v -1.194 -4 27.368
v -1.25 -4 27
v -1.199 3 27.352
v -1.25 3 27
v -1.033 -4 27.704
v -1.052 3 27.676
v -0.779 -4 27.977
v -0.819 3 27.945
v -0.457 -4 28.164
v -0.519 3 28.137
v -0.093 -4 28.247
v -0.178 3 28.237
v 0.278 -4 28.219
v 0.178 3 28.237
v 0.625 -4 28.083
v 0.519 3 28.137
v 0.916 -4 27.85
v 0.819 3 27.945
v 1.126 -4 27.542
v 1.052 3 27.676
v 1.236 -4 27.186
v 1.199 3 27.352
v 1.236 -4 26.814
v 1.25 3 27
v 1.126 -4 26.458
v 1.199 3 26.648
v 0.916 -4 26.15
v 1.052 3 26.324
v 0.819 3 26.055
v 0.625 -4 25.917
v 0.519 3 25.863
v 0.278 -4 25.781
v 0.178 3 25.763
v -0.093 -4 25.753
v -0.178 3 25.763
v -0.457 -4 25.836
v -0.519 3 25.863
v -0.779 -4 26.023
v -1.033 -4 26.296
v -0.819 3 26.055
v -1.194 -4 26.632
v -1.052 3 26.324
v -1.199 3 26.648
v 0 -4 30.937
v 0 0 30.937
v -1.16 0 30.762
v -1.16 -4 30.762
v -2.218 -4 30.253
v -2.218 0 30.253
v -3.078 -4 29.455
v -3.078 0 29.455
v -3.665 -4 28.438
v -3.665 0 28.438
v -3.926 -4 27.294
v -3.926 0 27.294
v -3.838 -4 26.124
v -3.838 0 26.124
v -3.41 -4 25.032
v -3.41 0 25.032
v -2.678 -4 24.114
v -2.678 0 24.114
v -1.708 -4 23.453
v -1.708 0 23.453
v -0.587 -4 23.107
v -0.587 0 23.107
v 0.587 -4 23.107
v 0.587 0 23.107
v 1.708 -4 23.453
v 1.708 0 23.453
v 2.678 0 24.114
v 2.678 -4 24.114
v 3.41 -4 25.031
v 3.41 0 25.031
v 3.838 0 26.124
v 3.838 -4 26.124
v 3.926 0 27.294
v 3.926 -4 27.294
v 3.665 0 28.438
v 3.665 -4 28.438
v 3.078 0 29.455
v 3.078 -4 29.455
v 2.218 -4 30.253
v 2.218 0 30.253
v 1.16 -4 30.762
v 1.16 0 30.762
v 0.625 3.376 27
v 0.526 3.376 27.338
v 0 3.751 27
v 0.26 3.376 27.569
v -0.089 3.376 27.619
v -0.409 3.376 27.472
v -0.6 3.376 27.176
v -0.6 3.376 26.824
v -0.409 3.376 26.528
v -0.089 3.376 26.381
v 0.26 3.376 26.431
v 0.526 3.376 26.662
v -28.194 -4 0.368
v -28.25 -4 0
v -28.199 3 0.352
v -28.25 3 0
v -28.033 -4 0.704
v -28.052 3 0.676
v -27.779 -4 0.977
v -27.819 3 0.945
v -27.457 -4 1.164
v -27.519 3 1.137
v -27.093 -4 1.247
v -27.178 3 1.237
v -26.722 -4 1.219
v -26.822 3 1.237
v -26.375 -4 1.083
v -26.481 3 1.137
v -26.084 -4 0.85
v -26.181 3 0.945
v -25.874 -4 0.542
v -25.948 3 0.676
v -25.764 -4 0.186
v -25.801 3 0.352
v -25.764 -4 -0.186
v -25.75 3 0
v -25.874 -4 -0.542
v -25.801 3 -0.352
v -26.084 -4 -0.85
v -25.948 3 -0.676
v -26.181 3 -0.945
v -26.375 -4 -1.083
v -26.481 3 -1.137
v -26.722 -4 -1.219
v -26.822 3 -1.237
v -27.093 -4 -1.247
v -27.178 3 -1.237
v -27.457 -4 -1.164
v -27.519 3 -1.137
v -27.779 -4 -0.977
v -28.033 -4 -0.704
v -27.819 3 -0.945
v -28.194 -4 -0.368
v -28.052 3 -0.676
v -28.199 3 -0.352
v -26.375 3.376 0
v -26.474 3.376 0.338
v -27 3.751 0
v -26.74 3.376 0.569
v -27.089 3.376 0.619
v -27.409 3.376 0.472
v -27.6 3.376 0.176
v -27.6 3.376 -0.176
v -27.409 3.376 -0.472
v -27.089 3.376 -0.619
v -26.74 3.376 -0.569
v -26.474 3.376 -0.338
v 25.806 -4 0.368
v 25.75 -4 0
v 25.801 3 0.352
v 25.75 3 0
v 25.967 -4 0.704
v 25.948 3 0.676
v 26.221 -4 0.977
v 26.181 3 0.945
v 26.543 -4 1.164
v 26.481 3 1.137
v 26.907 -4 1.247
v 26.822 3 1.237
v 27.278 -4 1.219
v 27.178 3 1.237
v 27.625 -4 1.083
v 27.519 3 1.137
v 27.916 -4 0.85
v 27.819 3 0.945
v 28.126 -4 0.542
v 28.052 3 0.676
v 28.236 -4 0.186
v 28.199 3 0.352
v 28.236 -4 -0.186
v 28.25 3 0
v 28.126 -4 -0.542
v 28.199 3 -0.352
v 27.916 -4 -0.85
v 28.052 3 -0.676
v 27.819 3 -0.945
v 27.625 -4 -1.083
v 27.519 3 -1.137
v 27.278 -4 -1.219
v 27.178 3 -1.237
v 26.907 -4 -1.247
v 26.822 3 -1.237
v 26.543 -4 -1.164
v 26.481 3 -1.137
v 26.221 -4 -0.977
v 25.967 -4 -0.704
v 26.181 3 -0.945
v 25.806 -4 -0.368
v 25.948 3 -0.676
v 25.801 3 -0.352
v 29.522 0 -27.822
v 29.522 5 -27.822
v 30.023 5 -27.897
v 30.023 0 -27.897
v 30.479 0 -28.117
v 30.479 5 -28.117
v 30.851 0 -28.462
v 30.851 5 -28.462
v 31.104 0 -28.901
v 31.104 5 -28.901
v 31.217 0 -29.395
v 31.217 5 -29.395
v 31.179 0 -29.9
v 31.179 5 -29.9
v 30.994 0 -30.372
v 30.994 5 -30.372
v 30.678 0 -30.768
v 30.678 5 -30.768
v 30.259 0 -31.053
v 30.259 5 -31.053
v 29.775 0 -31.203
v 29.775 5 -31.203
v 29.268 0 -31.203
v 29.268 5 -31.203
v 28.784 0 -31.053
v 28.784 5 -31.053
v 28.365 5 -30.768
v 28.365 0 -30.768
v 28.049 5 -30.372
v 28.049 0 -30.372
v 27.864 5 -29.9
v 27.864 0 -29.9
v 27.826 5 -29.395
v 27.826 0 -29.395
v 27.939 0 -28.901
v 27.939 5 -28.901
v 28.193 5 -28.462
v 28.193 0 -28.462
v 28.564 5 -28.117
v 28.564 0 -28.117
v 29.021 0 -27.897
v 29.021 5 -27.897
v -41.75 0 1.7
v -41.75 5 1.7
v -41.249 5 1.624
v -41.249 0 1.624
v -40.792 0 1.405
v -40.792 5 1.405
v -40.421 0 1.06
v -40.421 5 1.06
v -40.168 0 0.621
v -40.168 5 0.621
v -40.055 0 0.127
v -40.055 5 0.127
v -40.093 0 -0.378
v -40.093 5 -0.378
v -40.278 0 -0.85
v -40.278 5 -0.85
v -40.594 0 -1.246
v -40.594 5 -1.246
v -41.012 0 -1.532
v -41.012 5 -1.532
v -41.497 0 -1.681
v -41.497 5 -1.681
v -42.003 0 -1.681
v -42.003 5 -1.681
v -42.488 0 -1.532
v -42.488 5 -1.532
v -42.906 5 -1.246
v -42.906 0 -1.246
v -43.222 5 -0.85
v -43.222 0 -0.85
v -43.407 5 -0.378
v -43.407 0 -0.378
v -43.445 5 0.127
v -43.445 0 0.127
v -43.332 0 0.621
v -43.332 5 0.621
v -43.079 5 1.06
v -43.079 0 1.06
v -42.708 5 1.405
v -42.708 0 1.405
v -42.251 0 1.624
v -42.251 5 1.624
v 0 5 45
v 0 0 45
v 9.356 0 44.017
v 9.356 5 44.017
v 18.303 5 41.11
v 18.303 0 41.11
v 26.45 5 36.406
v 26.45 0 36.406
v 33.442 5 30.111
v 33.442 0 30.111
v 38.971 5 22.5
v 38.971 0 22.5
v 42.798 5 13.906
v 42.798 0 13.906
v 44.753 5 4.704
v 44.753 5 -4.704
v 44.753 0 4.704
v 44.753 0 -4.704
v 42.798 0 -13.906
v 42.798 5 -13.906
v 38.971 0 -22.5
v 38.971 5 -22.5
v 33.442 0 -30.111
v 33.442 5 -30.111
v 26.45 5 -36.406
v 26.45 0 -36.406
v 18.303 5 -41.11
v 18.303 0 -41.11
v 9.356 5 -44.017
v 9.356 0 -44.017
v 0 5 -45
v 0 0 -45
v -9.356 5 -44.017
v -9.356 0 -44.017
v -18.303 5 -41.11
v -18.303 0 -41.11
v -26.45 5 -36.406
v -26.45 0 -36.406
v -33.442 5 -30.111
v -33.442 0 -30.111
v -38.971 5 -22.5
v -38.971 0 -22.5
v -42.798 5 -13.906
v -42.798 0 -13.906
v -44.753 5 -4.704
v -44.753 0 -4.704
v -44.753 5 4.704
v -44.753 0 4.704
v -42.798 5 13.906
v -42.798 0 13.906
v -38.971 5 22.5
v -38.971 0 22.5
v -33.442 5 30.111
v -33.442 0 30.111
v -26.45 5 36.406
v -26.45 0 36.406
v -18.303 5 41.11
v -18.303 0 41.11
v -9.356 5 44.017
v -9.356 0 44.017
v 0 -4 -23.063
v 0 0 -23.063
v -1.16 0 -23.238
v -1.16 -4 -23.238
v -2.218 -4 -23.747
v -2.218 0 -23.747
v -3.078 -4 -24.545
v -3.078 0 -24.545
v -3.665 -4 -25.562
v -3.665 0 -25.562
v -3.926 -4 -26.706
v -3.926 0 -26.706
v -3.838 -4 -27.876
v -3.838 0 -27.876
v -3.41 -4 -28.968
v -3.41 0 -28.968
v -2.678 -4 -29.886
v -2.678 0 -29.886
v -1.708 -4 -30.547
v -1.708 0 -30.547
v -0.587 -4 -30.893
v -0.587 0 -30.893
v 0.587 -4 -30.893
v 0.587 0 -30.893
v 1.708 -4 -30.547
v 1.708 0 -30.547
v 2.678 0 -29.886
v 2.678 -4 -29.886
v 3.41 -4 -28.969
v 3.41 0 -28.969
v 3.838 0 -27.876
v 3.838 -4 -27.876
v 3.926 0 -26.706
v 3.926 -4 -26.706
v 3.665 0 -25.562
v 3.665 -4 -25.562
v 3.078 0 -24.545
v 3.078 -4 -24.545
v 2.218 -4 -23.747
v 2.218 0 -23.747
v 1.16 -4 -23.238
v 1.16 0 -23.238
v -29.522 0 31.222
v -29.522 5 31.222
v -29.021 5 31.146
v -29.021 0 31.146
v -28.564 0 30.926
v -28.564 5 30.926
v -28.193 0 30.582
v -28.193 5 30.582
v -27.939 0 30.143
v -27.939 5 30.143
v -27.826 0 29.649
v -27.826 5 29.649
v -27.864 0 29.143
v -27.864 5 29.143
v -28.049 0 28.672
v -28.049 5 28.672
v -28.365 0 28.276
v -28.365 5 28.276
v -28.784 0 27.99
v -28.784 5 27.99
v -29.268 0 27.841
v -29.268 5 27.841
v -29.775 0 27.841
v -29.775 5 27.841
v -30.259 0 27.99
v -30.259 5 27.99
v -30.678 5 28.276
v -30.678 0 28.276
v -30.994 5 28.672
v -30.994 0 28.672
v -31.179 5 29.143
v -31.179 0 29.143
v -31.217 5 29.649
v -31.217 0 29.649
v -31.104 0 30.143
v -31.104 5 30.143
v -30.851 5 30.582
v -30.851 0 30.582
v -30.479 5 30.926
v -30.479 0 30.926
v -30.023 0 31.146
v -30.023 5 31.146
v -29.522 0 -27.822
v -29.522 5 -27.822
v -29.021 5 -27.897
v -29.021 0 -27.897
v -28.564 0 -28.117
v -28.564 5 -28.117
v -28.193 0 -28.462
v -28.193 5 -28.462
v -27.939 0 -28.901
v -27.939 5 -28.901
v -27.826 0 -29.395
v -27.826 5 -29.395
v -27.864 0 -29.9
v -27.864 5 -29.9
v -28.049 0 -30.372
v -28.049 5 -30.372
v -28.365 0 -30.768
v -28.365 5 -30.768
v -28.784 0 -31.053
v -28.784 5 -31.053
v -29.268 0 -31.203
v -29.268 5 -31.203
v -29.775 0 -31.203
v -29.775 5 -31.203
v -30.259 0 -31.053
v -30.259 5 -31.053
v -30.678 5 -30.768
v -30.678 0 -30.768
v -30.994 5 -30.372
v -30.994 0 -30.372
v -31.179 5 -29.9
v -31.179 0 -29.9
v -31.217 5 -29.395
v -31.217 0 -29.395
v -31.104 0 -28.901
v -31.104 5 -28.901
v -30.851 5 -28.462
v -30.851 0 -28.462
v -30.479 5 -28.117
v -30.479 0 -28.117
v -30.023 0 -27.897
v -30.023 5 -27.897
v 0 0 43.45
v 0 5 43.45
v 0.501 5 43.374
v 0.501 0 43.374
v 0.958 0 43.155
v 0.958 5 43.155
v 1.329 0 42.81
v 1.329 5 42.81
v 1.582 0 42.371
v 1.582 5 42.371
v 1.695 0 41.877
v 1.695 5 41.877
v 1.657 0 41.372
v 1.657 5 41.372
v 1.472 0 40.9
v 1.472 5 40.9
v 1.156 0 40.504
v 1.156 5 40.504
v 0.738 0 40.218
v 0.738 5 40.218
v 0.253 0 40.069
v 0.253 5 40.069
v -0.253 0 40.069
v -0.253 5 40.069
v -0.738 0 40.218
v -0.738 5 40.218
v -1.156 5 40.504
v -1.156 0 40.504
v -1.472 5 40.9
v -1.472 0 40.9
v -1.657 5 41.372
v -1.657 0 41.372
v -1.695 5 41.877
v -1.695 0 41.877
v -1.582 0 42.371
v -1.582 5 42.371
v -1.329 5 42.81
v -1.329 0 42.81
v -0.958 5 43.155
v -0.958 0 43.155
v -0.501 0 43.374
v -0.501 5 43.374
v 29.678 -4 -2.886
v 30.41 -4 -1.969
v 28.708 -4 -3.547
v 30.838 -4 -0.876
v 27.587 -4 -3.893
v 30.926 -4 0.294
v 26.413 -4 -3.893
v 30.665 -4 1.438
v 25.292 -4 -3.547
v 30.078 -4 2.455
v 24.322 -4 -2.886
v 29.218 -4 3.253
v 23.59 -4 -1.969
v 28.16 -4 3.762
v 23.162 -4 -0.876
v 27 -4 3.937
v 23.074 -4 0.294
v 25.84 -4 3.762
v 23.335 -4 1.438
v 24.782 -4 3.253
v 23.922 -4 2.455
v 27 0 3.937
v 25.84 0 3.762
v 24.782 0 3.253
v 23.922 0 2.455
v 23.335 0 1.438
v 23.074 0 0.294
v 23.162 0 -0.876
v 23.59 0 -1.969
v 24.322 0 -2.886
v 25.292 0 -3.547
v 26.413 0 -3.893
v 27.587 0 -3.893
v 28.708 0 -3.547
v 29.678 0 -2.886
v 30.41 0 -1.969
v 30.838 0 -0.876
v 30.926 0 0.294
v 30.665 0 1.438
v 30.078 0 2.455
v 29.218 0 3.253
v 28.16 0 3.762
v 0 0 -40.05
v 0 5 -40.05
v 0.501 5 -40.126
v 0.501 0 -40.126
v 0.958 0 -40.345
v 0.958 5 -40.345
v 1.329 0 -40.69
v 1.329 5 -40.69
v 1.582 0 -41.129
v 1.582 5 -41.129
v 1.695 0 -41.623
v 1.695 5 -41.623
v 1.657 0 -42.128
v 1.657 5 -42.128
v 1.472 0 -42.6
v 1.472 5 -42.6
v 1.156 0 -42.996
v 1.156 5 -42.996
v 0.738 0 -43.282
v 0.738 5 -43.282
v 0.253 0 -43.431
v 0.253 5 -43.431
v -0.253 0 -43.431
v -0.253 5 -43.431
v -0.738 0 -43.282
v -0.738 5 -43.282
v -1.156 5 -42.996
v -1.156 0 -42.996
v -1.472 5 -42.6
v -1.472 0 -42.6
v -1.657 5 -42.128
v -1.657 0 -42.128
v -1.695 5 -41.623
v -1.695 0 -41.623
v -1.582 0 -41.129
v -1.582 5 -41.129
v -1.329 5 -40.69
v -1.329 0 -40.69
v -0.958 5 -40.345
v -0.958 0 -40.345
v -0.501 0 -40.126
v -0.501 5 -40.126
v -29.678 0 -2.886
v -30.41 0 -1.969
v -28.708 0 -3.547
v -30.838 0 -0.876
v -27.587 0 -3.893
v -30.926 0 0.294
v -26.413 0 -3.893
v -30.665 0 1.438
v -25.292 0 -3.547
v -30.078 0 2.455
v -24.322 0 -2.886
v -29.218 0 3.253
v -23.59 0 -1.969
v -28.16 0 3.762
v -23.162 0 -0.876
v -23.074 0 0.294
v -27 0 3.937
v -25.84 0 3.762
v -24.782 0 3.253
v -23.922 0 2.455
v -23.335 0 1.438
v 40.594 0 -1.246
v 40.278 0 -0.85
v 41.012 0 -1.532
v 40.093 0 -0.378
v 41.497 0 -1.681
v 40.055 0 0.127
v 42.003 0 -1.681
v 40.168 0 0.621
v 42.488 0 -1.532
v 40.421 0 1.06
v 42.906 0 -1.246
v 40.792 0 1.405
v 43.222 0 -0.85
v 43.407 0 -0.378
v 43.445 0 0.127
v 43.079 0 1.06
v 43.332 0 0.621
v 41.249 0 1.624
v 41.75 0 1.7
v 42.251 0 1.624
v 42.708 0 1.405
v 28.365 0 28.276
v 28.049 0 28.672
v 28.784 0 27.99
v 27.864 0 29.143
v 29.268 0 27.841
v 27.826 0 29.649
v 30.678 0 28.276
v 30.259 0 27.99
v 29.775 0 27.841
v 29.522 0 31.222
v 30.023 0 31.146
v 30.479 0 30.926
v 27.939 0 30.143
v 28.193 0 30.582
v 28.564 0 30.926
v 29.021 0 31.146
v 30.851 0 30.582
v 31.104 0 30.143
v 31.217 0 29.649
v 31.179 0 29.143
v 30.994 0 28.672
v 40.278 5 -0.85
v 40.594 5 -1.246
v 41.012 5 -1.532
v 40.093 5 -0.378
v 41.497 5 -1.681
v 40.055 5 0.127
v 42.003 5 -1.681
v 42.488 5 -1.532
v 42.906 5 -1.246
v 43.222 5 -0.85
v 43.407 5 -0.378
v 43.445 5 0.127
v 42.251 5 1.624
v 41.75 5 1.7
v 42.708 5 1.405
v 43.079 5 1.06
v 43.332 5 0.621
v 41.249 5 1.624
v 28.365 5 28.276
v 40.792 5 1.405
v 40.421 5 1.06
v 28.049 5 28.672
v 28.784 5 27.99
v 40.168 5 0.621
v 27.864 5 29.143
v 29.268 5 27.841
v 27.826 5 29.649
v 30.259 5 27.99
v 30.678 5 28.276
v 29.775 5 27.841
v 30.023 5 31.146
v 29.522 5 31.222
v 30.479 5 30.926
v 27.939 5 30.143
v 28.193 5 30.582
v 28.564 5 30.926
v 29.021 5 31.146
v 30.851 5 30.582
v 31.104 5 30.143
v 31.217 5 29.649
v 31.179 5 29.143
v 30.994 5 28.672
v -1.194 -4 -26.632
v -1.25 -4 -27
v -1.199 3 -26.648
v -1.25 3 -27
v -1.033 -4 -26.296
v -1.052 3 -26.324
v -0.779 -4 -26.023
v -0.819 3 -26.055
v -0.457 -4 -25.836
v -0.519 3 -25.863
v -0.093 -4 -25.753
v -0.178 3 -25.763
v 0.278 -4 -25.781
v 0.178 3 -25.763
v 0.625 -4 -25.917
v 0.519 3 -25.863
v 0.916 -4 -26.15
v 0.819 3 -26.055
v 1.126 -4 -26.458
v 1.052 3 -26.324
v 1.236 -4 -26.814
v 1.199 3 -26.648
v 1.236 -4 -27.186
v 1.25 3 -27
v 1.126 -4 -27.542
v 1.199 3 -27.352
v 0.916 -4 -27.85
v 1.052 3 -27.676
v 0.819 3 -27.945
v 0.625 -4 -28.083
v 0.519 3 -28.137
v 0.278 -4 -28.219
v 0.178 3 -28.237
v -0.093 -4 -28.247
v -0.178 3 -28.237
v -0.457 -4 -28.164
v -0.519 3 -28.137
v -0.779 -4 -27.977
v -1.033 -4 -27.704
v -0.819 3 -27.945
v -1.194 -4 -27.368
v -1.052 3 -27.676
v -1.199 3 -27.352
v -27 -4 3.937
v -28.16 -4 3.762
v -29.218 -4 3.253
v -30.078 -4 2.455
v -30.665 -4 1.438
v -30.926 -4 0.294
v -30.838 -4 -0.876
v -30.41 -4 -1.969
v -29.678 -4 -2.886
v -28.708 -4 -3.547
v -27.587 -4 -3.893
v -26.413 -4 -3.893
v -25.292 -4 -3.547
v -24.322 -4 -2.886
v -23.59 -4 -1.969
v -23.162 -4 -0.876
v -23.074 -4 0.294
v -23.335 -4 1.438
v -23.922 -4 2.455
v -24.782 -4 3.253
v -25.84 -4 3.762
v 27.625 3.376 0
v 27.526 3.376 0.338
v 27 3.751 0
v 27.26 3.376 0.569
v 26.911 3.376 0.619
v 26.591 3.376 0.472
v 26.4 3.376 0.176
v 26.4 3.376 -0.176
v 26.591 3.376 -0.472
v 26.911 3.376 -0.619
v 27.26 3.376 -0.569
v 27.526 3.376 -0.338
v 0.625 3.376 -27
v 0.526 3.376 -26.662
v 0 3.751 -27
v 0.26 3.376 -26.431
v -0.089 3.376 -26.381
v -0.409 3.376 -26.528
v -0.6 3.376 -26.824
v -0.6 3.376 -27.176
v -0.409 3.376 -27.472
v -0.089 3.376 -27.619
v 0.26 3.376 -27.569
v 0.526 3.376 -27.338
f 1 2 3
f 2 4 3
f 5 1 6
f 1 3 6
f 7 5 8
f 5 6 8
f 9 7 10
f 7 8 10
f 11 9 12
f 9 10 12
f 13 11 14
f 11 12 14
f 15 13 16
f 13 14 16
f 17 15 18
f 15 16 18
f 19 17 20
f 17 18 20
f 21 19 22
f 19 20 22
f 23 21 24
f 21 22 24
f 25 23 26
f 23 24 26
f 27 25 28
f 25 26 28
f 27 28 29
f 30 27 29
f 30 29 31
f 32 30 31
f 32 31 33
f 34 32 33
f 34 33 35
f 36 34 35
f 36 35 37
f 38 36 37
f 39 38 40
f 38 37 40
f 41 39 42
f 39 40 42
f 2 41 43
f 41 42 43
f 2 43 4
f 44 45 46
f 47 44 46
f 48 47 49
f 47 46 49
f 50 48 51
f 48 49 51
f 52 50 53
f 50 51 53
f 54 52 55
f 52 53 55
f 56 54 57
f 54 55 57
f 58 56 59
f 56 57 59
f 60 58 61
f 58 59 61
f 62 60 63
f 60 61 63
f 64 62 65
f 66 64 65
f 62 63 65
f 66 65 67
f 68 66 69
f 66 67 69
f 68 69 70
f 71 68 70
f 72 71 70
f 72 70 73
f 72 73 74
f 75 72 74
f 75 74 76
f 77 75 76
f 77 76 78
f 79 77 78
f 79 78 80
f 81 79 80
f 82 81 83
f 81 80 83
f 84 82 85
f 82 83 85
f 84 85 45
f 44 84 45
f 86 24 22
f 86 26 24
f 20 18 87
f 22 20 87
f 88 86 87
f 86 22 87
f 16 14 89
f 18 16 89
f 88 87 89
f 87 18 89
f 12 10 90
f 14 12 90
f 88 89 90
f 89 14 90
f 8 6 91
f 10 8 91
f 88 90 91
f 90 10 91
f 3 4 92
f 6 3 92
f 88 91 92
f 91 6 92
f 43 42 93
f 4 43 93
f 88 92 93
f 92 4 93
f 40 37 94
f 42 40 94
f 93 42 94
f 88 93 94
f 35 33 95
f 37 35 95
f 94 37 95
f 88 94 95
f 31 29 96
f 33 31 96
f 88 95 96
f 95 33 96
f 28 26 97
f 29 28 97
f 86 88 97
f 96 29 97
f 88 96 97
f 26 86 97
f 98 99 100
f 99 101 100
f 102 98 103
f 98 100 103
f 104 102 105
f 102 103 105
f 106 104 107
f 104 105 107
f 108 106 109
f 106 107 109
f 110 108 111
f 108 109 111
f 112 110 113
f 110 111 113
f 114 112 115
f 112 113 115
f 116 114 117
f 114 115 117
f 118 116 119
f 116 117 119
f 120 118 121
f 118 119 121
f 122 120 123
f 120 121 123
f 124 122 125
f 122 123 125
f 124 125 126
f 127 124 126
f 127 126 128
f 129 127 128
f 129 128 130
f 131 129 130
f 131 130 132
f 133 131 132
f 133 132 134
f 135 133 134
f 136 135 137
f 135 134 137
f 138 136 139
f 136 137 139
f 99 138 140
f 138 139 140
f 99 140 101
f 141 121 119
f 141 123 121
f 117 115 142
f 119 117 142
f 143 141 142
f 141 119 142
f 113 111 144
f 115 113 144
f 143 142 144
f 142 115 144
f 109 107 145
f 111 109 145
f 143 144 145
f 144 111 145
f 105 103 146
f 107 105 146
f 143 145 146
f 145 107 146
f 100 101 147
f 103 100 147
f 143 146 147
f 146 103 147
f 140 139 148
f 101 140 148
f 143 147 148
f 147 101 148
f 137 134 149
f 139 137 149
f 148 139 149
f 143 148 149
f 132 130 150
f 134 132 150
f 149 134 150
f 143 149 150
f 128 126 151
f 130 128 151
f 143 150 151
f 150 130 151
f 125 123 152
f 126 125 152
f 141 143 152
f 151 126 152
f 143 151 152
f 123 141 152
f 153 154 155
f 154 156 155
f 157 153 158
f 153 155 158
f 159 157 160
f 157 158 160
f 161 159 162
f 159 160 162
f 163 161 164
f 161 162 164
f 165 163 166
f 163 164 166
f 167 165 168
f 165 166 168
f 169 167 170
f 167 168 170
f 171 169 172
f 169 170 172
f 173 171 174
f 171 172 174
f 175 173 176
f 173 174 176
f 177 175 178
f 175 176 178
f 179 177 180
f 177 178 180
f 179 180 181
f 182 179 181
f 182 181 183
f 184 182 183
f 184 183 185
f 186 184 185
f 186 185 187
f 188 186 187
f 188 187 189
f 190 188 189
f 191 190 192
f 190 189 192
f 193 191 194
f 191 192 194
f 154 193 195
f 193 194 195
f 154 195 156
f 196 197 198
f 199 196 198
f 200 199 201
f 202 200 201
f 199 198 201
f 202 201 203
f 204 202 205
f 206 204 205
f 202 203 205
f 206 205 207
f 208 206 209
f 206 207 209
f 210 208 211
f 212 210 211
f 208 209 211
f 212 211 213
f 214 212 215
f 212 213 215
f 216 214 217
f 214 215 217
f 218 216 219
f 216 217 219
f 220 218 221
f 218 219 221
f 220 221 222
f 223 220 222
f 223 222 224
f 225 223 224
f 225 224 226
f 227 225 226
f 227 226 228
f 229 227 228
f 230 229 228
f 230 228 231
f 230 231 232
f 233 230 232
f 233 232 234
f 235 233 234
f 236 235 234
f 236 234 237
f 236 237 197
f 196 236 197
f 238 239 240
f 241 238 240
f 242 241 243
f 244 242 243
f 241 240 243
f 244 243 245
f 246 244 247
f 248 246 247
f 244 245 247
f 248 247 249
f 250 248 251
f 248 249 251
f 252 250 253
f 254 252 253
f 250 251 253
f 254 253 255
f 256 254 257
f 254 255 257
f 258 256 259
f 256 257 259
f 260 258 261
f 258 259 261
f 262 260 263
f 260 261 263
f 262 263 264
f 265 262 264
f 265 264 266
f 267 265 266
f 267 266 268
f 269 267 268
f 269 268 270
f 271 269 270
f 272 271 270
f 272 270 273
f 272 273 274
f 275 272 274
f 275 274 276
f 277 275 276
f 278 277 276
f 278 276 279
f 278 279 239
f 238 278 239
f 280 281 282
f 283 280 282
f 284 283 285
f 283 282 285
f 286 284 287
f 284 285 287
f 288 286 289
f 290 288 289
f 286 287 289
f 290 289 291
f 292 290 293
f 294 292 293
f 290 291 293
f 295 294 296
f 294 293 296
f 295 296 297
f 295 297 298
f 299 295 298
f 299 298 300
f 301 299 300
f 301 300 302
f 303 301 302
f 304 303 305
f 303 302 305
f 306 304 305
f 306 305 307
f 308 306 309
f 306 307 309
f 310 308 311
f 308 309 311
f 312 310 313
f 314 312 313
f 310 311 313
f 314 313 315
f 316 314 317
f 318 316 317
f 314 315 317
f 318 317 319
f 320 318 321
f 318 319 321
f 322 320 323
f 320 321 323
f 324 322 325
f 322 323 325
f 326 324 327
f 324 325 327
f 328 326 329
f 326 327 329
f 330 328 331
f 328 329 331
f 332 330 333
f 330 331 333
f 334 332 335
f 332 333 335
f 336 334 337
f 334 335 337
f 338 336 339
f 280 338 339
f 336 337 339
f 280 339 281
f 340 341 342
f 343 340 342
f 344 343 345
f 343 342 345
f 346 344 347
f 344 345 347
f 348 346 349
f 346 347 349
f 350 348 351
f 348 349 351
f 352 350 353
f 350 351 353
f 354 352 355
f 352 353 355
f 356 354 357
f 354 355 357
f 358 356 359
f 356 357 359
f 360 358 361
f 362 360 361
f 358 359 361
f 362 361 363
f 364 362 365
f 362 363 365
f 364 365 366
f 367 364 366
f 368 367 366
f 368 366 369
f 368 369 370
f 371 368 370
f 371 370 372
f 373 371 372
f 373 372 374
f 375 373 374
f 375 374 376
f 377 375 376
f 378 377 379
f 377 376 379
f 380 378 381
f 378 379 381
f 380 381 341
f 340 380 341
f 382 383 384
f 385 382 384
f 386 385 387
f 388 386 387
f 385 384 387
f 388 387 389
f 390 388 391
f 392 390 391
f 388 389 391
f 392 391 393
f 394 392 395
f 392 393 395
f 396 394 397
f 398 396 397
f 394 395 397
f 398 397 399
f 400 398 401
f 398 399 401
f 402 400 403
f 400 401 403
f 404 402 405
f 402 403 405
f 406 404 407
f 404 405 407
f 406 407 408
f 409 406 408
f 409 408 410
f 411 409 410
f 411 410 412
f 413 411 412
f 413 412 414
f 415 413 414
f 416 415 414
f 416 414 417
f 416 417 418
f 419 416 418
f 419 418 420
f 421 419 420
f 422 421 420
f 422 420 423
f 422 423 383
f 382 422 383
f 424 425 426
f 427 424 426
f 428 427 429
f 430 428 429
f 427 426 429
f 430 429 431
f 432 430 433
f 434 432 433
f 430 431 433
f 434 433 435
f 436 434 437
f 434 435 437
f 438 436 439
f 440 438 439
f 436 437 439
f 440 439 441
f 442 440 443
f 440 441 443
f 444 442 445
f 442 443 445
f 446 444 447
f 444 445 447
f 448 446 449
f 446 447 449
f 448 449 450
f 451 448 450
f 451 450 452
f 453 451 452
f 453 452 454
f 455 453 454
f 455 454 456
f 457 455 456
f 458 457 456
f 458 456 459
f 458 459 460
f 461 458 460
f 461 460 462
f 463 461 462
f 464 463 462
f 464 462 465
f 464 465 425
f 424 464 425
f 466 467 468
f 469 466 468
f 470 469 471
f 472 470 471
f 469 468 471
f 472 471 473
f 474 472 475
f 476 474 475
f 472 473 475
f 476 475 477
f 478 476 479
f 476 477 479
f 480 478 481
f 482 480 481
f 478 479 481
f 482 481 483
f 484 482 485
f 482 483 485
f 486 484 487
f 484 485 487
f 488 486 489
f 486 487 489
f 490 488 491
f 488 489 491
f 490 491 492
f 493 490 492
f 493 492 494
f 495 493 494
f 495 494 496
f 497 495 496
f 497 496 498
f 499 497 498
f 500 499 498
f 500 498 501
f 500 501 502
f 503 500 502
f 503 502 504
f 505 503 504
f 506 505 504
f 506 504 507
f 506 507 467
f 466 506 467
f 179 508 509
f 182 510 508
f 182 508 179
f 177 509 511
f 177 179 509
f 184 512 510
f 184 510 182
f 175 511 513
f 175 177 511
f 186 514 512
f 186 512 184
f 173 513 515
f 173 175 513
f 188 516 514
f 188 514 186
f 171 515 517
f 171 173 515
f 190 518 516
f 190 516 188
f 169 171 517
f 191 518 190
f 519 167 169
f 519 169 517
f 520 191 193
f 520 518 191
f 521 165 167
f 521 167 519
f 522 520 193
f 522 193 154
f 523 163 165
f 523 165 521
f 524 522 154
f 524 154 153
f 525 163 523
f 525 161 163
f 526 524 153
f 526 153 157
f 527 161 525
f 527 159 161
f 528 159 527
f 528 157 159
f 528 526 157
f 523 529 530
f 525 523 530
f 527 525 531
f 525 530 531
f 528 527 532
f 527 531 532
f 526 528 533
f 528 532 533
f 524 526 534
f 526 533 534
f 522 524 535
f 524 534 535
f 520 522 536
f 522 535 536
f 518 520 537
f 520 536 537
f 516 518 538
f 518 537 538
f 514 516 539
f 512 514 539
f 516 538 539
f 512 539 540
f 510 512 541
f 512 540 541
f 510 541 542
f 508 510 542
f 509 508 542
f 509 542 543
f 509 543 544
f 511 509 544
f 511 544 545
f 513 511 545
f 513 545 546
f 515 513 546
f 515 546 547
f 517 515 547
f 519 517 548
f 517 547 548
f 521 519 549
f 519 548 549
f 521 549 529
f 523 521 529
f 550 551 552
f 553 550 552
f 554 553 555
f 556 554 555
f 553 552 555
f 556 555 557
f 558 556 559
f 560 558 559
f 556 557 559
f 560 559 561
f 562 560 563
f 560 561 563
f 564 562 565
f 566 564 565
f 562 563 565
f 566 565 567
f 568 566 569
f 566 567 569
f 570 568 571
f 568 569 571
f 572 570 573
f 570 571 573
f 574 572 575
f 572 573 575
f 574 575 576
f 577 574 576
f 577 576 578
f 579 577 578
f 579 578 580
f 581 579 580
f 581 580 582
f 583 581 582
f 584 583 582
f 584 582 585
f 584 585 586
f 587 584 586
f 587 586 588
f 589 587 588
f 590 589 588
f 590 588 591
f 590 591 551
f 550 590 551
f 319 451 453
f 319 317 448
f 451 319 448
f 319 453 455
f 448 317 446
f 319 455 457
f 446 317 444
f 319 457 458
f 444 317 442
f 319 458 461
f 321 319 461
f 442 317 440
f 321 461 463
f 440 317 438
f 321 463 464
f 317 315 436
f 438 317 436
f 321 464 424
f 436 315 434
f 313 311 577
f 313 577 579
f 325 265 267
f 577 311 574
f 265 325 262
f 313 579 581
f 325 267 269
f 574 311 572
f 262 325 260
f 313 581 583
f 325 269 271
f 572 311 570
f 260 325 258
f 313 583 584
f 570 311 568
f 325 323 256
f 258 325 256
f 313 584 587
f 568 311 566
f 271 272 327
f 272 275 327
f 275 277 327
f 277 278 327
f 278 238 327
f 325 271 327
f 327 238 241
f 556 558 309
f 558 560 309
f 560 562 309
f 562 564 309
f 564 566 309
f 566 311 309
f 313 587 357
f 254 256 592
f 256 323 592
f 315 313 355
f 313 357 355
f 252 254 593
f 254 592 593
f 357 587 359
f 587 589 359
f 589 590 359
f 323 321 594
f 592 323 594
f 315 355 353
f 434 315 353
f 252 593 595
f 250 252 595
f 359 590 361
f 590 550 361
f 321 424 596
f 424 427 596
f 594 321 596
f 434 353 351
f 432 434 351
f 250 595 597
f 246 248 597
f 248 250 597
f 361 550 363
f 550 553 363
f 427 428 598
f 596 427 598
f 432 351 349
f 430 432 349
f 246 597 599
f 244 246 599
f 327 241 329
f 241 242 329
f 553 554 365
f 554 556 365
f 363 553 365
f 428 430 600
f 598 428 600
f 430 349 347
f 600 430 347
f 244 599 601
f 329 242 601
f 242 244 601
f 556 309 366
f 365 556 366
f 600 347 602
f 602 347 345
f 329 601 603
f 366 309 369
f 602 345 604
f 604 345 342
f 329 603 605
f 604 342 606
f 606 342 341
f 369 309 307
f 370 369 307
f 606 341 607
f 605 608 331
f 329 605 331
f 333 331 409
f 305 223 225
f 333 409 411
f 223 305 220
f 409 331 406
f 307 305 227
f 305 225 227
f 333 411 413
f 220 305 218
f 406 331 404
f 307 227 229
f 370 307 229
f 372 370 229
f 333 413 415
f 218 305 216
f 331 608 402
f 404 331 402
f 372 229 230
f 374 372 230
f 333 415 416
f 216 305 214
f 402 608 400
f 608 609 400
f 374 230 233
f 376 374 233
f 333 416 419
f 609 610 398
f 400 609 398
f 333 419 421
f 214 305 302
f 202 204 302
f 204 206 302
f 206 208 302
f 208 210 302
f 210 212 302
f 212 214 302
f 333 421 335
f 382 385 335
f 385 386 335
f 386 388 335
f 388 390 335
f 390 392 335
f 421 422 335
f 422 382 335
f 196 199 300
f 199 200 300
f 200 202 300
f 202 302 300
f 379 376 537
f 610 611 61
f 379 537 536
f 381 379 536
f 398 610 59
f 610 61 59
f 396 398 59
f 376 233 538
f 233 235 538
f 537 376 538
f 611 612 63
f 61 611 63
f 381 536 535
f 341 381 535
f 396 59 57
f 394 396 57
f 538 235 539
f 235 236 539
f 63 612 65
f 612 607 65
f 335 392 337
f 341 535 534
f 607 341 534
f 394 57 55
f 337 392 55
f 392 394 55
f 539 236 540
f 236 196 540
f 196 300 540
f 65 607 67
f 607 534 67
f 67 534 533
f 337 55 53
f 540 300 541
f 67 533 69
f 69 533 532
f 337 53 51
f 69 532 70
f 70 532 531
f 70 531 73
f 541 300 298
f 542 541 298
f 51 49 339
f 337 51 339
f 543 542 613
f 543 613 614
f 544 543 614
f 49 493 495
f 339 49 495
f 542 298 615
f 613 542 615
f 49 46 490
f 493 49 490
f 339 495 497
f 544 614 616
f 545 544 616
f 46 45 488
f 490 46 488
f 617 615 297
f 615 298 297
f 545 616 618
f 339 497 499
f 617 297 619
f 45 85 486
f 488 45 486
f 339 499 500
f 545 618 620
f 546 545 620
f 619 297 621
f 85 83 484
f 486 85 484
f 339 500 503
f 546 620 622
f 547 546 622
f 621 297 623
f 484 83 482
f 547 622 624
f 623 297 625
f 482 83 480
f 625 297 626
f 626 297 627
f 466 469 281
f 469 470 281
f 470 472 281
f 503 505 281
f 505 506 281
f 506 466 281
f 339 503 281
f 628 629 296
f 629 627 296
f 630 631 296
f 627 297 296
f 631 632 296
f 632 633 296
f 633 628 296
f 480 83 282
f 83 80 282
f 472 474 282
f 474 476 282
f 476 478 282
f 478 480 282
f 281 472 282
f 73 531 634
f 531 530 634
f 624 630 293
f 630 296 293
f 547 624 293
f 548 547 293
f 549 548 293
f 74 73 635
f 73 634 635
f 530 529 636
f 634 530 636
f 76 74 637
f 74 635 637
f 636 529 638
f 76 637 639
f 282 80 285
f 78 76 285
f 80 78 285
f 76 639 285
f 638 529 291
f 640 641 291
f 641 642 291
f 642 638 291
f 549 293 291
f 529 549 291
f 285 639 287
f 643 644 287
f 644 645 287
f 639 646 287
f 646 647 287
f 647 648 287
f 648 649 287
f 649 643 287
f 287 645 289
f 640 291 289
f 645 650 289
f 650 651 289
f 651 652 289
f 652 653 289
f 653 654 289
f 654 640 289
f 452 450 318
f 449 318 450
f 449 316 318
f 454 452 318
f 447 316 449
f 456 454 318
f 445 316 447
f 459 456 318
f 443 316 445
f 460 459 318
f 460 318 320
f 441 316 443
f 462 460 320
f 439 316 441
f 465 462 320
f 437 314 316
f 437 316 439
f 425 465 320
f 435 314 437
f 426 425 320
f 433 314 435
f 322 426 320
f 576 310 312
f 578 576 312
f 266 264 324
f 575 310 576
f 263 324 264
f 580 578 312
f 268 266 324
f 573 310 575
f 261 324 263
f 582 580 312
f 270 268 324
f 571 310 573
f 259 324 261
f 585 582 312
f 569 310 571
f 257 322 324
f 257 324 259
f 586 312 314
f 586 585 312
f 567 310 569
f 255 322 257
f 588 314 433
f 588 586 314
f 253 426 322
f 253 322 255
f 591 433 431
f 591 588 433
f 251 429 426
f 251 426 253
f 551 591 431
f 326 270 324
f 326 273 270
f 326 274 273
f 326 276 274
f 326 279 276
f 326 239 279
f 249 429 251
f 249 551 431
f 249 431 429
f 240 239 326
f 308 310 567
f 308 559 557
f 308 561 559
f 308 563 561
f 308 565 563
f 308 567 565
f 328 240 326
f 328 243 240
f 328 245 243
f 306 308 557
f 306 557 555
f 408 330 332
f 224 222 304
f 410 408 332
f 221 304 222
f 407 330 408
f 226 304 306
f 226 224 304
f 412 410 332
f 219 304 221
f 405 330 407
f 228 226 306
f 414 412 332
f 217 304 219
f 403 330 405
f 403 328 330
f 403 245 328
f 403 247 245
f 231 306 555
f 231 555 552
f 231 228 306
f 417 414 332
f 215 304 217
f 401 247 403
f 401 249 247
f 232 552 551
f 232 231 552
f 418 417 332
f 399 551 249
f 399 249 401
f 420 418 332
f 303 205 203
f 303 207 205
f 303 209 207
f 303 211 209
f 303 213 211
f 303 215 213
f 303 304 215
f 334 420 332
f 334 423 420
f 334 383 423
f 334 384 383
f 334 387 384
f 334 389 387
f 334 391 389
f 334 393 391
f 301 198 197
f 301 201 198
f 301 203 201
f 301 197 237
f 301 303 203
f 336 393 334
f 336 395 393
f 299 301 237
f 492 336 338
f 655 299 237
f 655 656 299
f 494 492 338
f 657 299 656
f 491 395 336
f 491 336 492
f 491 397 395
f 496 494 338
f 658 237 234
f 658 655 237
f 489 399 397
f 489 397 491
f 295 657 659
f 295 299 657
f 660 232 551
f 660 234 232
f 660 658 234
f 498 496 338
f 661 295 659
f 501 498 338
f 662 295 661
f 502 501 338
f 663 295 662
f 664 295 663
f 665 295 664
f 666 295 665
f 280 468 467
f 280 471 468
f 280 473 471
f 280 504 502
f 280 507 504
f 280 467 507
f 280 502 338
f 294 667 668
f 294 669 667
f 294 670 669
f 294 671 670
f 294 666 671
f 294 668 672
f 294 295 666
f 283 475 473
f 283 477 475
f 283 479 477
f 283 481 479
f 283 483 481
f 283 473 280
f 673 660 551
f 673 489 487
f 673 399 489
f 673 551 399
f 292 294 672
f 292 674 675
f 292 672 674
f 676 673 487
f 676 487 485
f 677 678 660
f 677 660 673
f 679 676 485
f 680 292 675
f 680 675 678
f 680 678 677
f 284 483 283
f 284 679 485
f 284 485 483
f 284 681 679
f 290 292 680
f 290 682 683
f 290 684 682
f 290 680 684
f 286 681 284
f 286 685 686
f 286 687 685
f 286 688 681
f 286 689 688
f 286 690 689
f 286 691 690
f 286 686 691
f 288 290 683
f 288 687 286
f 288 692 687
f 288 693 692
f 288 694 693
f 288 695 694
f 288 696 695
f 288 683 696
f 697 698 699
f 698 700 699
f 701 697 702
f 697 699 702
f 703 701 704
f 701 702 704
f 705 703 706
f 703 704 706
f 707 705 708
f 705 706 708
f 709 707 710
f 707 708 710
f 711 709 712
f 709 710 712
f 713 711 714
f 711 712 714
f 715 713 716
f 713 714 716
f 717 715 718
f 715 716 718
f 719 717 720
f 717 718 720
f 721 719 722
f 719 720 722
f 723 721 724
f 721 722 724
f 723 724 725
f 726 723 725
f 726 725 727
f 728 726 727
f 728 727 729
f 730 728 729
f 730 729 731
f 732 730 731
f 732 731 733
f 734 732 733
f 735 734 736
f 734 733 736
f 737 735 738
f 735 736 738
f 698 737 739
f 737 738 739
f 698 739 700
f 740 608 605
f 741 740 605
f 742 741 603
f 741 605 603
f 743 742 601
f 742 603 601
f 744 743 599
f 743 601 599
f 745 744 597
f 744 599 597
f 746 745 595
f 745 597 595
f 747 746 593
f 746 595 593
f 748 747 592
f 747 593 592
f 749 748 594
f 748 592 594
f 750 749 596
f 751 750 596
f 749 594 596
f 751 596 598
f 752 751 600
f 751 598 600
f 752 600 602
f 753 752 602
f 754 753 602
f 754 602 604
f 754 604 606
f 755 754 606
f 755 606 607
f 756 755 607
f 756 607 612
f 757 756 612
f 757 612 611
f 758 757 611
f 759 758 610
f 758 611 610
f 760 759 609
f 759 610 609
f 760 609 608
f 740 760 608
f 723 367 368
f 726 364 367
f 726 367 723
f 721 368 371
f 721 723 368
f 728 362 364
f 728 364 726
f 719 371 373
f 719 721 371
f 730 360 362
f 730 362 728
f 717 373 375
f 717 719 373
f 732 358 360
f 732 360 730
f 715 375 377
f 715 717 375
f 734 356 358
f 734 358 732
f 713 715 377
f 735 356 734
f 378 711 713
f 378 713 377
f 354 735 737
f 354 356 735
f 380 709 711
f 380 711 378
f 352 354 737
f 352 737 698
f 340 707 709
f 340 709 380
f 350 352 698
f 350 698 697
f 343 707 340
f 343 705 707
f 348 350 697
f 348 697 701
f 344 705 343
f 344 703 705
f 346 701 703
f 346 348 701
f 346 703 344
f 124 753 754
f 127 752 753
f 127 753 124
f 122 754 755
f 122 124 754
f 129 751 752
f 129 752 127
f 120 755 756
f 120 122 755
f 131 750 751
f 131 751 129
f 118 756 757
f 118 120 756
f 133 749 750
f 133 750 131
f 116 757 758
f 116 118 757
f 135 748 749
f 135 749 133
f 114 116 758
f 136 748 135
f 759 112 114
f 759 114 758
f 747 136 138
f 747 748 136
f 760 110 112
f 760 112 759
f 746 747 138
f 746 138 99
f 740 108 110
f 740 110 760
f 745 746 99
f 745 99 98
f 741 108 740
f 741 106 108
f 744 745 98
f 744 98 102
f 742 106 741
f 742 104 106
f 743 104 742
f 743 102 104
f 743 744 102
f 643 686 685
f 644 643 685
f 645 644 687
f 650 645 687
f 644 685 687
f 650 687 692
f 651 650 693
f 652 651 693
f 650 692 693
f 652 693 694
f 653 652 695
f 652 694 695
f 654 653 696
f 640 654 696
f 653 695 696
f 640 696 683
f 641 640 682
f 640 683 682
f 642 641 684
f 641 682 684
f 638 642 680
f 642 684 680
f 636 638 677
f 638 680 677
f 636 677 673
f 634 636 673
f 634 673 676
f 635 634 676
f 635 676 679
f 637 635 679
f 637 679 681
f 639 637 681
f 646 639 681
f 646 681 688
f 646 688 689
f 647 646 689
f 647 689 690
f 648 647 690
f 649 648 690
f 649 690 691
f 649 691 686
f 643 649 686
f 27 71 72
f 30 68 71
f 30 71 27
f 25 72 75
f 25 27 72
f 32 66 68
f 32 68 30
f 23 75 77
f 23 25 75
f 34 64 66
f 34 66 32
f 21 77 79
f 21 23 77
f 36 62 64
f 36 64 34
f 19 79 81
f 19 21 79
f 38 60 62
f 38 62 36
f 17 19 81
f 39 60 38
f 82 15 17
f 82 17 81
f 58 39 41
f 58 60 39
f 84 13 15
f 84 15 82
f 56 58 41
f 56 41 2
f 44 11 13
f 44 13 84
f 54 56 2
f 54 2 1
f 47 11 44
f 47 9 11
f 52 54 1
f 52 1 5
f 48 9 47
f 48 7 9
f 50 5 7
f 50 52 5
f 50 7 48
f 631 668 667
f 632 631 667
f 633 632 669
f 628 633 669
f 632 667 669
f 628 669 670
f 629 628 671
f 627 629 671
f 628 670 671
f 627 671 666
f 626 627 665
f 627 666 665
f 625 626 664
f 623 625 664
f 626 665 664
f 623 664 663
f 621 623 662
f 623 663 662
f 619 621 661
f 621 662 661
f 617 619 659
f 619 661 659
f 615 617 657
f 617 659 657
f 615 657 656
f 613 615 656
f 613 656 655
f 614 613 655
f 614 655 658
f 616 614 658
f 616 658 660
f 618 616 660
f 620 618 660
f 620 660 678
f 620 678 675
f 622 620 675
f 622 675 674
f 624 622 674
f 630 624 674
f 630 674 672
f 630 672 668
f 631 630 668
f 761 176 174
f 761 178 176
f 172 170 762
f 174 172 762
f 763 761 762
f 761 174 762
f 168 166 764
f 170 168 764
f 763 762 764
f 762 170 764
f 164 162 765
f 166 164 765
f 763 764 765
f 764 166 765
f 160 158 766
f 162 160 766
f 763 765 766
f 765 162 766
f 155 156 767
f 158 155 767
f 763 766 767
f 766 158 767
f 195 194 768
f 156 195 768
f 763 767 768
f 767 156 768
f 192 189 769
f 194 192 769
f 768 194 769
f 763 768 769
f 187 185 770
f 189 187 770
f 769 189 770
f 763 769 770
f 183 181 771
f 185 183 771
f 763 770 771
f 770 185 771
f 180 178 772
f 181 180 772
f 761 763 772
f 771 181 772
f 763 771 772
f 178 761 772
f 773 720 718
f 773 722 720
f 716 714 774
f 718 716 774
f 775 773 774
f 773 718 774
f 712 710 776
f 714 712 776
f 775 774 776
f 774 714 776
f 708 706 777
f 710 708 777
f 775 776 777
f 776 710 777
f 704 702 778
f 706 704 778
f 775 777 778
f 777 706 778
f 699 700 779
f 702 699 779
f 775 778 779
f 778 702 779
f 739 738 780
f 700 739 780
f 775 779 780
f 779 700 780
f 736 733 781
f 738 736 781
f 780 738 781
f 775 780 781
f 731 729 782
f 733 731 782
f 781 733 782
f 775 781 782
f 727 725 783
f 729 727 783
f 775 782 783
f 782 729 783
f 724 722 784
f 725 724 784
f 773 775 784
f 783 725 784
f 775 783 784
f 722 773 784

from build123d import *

# Parameters (mm, degrees)
SKETCH1_R             = 45
SKETCH1_R_2           = 1.5
BOSS_EXTRUDE2_DEPTH   = 5
SKETCH9_R             = 3.937
BOSS_EXTRUDE7_DEPTH   = 4
SKETCH10_R            = 1.7
CUT_EXTRUDE9_DEPTH    = 14
M3_TAPPED_HOLE1_D     = 2.5
M3_TAPPED_HOLE1_DEPTH = 7
M3_TAPPED_HOLE1_TIP   = 0.751075774


with BuildPart() as part:
    # Sketch1 → Boss-Extrude2 (new body)
    with BuildSketch(Plane(origin=(0, 0, 0), x_dir=(1, 0, 0), z_dir=(0, 1, 0))):
        with Locations(Location((0, 0, 0), (0, 0, 270))):
            Circle(SKETCH1_R)
        with Locations(Location((0, 41.75, 0), (0, 0, 270))):
            Circle(SKETCH1_R_2, mode=Mode.SUBTRACT)
        with Locations(Location((29.521708115, 29.521708115, 0), (0, 0, 270))):
            Circle(SKETCH1_R_2, mode=Mode.SUBTRACT)
        with Locations(Location((41.75, 0, 0), (0, 0, 270))):
            Circle(SKETCH1_R_2, mode=Mode.SUBTRACT)
        with Locations(Location((29.521708115, -29.521708115, 0), (0, 0, 270))):
            Circle(SKETCH1_R_2, mode=Mode.SUBTRACT)
        with Locations(Location((0, -41.75, 0), (0, 0, 270))):
            Circle(SKETCH1_R_2, mode=Mode.SUBTRACT)
        with Locations(Location((-29.521708115, -29.521708115, 0), (0, 0, 270))):
            Circle(SKETCH1_R_2, mode=Mode.SUBTRACT)
        with Locations(Location((-41.75, 0, 0), (0, 0, 270))):
            Circle(SKETCH1_R_2, mode=Mode.SUBTRACT)
        with Locations(Location((-29.521708115, 29.521708115, 0), (0, 0, 270))):
            Circle(SKETCH1_R_2, mode=Mode.SUBTRACT)
    extrude(amount=BOSS_EXTRUDE2_DEPTH)

    # Sketch9 → Boss-Extrude7 (add)
    with BuildSketch(Plane.XZ):
        with Locations(Location((27, 0, 0), (0, 0, 90))):
            Circle(SKETCH9_R)
        with Locations(Location((0, -27, 0), (0, 0, 90))):
            Circle(SKETCH9_R)
        with Locations(Location((-27, 0, 0), (0, 0, 90))):
            Circle(SKETCH9_R)
        with Locations(Location((0, 27, 0), (0, 0, 90))):
            Circle(SKETCH9_R)
    extrude(amount=BOSS_EXTRUDE7_DEPTH)

    # Sketch10 → Cut-Extrude9 (cut)
    with BuildSketch(Plane(origin=(0, 5, 0), x_dir=(1, 0, 0), z_dir=(0, 1, 0))):
        with Locations(Location((0, 41.75, 0), (0, 0, 270))):
            Circle(SKETCH10_R)
        with Locations(Location((29.521708115, 29.521708115, 0), (0, 0, 270))):
            Circle(SKETCH10_R)
        with Locations(Location((41.75, 0, 0), (0, 0, 270))):
            Circle(SKETCH10_R)
        with Locations(Location((29.521708115, -29.521708115, 0), (0, 0, 270))):
            Circle(SKETCH10_R)
        with Locations(Location((0, -41.75, 0), (0, 0, 270))):
            Circle(SKETCH10_R)
        with Locations(Location((-29.521708115, -29.521708115, 0), (0, 0, 270))):
            Circle(SKETCH10_R)
        with Locations(Location((-41.75, 0, 0), (0, 0, 270))):
            Circle(SKETCH10_R)
        with Locations(Location((-29.521708115, 29.521708115, 0), (0, 0, 270))):
            Circle(SKETCH10_R)
    extrude(amount=-CUT_EXTRUDE9_DEPTH, mode=Mode.SUBTRACT)

    # M3 Tapped Hole1
    with Locations(Plane.XZ.offset(4)):
        with Locations((0, 27), (27, 0), (0, -27), (-27, 0)):
            Hole(M3_TAPPED_HOLE1_D / 2, depth=M3_TAPPED_HOLE1_DEPTH)
            with Locations((0, 0, -(M3_TAPPED_HOLE1_DEPTH + M3_TAPPED_HOLE1_TIP / 2))):  # 118° drill point
                Cone(0, M3_TAPPED_HOLE1_D / 2, M3_TAPPED_HOLE1_TIP, mode=Mode.SUBTRACT)


solid = part.part
